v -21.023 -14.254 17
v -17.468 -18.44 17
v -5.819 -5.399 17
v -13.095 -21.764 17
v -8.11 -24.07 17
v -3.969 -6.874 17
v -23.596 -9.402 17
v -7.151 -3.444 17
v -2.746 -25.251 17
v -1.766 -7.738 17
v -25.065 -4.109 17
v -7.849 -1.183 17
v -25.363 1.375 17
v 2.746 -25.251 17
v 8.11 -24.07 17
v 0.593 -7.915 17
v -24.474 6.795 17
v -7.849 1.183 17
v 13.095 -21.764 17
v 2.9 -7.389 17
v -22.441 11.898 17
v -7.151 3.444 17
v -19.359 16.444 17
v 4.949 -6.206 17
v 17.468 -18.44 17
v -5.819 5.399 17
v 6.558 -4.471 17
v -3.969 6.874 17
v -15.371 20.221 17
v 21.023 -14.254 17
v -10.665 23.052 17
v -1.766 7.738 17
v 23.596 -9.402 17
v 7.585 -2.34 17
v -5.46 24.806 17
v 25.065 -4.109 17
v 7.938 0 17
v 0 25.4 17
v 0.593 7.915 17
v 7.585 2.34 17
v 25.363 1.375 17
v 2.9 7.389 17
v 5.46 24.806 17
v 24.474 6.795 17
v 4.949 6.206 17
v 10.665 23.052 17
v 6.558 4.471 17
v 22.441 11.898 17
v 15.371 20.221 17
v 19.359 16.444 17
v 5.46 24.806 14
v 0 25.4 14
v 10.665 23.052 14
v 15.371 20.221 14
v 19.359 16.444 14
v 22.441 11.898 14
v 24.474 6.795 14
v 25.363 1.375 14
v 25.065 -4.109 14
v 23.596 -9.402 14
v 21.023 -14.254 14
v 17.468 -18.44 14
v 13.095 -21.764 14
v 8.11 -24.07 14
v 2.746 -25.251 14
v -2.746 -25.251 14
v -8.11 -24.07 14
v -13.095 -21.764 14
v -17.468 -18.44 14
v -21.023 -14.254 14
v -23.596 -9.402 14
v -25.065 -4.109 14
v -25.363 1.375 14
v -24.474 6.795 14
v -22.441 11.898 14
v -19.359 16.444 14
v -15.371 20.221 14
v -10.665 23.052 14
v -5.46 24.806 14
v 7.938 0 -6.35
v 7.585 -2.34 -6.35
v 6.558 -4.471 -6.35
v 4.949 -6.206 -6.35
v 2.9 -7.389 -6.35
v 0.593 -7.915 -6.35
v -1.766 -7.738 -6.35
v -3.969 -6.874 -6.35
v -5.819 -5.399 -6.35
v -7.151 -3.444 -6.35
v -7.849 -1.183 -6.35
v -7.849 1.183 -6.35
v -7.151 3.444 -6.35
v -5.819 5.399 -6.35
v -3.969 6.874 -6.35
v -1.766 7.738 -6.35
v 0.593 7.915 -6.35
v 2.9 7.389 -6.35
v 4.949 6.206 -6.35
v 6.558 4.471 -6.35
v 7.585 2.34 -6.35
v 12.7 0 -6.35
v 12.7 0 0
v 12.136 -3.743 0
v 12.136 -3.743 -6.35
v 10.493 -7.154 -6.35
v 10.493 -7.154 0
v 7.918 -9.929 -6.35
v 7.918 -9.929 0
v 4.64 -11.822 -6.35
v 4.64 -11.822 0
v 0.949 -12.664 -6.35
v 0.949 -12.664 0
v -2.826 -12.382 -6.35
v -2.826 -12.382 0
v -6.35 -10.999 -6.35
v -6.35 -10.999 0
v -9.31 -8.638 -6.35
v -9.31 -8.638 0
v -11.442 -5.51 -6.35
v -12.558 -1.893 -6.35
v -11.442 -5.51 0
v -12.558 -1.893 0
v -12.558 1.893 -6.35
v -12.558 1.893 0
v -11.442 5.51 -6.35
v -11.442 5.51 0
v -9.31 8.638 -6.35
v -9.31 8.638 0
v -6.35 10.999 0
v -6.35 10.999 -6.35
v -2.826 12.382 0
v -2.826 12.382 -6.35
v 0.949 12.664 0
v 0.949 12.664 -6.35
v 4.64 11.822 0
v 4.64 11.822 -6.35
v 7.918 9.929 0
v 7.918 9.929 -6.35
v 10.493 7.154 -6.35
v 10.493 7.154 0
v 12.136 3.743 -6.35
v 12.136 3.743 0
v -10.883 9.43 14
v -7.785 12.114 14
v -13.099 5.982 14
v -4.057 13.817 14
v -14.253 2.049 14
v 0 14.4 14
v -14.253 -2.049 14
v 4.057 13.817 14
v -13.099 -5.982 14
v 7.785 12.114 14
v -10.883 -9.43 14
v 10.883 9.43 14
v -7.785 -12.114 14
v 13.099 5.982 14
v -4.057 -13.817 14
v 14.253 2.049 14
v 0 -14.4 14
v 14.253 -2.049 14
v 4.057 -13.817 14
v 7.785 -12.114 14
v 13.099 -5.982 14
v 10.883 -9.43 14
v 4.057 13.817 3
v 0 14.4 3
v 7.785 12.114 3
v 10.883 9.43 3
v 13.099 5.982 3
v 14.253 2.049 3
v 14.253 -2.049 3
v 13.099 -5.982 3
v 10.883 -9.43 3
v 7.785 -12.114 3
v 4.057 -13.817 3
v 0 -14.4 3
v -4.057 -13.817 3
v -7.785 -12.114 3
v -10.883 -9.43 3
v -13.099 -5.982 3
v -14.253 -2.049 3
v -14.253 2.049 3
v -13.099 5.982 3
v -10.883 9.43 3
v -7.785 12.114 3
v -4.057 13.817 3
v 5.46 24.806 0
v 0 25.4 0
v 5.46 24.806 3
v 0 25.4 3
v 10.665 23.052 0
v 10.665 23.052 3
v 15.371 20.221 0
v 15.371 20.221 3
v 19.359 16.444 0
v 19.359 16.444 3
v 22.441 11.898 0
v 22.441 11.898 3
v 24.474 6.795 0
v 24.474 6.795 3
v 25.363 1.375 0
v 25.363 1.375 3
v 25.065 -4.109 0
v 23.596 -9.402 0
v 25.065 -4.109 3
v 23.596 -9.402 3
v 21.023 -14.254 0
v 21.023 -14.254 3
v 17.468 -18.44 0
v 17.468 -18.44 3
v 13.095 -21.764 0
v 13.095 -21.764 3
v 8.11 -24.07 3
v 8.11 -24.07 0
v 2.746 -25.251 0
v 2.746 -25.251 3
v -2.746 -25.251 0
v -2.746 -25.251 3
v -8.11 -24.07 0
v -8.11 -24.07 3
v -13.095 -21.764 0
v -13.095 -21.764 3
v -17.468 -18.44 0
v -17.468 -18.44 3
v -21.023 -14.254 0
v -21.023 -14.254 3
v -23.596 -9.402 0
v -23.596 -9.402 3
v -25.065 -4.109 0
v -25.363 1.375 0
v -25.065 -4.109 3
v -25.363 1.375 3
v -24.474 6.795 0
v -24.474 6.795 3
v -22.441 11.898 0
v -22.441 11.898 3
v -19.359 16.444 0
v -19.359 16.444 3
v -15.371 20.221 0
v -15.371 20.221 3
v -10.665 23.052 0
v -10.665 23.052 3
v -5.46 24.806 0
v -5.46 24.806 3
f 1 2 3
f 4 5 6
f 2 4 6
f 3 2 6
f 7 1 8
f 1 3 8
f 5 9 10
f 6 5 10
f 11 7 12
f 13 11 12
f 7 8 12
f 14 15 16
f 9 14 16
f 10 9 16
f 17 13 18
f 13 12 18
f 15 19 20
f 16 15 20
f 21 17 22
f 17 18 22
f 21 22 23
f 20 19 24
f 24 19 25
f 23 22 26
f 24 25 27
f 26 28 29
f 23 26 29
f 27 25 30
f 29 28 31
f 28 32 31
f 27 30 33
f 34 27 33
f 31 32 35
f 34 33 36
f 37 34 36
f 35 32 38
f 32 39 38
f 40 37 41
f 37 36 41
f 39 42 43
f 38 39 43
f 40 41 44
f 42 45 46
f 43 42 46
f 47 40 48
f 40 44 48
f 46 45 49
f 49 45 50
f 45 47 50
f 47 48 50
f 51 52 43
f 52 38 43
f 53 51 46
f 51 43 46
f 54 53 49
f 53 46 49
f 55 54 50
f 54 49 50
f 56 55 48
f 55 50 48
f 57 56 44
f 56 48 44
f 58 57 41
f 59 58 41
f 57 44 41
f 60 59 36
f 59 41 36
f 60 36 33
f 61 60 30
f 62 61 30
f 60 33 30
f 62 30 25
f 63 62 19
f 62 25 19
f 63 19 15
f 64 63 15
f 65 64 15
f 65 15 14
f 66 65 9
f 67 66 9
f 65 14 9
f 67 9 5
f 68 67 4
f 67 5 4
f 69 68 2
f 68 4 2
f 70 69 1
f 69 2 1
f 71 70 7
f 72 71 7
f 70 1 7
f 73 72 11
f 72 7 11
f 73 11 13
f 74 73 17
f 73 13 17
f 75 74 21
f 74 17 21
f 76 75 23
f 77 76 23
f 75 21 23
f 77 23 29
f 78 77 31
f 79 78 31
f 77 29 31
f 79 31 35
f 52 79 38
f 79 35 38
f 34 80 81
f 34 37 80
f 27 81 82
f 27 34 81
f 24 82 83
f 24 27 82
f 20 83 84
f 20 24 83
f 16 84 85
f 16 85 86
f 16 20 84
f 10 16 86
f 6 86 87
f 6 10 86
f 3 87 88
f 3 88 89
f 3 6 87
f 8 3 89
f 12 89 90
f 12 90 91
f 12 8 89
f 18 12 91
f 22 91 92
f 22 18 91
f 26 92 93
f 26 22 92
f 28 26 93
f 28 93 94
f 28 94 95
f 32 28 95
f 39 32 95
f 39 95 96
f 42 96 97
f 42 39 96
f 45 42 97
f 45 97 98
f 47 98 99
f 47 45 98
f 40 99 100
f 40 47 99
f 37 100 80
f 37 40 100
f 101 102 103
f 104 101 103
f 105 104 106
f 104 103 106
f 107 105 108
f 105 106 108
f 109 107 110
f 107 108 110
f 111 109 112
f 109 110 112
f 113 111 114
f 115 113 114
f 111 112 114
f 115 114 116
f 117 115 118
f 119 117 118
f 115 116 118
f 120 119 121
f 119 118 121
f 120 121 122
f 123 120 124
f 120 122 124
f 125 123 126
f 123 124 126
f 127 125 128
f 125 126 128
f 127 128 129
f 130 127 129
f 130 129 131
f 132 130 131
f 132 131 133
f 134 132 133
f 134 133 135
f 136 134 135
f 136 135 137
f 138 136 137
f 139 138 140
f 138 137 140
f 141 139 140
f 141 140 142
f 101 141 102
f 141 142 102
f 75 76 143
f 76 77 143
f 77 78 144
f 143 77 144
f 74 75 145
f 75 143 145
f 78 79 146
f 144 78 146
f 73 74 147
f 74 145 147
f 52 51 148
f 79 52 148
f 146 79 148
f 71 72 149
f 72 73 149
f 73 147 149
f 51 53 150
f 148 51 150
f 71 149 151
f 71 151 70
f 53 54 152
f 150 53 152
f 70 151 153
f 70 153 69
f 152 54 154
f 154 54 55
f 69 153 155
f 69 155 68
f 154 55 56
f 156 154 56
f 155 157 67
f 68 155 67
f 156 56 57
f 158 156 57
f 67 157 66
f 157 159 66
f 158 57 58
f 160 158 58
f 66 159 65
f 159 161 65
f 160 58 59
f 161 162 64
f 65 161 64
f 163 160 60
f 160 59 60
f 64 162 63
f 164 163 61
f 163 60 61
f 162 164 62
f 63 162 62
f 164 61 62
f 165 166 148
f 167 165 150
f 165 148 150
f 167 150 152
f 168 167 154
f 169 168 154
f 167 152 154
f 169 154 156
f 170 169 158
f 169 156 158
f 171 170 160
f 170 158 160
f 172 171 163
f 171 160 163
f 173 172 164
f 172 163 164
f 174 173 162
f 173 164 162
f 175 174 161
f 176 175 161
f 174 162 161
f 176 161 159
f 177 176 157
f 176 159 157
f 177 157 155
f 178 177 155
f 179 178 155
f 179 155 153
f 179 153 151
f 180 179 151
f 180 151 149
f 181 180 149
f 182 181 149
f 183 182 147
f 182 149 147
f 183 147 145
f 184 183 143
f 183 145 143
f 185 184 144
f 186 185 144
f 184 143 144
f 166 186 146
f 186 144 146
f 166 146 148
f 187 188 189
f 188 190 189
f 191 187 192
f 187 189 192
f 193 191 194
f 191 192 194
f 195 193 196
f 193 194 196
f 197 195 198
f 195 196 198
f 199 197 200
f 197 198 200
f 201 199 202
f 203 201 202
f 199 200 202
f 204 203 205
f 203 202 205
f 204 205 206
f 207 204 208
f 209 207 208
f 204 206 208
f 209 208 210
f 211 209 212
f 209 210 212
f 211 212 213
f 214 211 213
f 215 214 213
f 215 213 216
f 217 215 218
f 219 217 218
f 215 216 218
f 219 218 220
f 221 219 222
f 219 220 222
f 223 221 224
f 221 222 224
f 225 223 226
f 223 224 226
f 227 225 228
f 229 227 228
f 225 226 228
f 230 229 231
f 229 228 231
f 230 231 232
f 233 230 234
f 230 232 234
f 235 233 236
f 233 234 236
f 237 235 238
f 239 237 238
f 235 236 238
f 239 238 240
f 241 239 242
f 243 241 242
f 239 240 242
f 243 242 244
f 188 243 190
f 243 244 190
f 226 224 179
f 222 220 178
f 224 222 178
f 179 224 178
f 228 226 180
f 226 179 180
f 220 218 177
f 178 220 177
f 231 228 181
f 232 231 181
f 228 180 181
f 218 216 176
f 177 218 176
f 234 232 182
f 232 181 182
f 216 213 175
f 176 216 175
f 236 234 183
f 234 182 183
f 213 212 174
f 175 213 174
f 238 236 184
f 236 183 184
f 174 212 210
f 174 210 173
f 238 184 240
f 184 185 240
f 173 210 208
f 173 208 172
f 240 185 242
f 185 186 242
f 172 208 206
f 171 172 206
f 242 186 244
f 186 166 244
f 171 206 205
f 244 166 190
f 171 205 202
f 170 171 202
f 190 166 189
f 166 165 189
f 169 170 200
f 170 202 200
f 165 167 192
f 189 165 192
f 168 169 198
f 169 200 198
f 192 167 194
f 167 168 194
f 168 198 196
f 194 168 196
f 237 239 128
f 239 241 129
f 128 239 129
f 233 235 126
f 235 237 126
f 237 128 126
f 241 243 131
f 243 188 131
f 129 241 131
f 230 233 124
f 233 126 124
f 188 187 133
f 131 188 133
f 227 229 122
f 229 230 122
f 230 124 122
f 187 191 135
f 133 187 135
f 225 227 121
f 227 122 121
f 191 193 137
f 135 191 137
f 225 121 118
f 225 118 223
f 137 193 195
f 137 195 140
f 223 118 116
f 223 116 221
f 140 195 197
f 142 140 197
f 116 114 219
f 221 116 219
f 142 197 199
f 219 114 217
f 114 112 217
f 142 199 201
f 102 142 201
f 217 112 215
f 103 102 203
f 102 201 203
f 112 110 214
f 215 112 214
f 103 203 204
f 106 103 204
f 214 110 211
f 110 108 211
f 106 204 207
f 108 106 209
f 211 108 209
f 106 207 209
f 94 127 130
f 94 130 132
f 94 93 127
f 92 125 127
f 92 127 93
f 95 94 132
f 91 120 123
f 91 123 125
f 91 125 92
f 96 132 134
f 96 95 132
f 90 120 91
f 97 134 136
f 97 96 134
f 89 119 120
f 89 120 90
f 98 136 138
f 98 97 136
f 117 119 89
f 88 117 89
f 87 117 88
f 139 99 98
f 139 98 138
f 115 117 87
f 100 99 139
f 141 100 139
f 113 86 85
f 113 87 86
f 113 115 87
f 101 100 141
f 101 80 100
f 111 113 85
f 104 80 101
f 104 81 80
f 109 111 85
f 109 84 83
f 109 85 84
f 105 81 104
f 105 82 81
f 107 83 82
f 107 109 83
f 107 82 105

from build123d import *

# Parameters (mm, degrees)
F2_R     = 7.9375
F3_DEPTH = 25.4
F4_R     = 12.7
F4_R_2   = 7.9375
F5_DEPTH = 6.35


with BuildPart() as f1:
    # F0 (on Right) → F1 (revolve)
    with BuildSketch(Plane.YZ):
        Polygon((0, 17), (0, 0), (25.4, 0), (25.4, 3), (14.4, 3), (14.4, 14), (25.4, 14), (25.4, 17), align=None)
    revolve(axis=Axis((0, 0, 8.5), (0, 0, -1)))

    # F2 (on face) → F3 (cut)
    with BuildSketch(Plane.XY.offset(17)):
        Circle(F2_R)
    extrude(amount=-F3_DEPTH, mode=Mode.SUBTRACT)

    # F4 (on face) → F5 (join)
    with BuildSketch(Plane(origin=(0, 0, 0), x_dir=(1, 0, 0), z_dir=(0, 0, -1))):
        Circle(F4_R)
        Circle(F4_R_2, mode=Mode.SUBTRACT)
    extrude(amount=F5_DEPTH)


solid = f1.part
